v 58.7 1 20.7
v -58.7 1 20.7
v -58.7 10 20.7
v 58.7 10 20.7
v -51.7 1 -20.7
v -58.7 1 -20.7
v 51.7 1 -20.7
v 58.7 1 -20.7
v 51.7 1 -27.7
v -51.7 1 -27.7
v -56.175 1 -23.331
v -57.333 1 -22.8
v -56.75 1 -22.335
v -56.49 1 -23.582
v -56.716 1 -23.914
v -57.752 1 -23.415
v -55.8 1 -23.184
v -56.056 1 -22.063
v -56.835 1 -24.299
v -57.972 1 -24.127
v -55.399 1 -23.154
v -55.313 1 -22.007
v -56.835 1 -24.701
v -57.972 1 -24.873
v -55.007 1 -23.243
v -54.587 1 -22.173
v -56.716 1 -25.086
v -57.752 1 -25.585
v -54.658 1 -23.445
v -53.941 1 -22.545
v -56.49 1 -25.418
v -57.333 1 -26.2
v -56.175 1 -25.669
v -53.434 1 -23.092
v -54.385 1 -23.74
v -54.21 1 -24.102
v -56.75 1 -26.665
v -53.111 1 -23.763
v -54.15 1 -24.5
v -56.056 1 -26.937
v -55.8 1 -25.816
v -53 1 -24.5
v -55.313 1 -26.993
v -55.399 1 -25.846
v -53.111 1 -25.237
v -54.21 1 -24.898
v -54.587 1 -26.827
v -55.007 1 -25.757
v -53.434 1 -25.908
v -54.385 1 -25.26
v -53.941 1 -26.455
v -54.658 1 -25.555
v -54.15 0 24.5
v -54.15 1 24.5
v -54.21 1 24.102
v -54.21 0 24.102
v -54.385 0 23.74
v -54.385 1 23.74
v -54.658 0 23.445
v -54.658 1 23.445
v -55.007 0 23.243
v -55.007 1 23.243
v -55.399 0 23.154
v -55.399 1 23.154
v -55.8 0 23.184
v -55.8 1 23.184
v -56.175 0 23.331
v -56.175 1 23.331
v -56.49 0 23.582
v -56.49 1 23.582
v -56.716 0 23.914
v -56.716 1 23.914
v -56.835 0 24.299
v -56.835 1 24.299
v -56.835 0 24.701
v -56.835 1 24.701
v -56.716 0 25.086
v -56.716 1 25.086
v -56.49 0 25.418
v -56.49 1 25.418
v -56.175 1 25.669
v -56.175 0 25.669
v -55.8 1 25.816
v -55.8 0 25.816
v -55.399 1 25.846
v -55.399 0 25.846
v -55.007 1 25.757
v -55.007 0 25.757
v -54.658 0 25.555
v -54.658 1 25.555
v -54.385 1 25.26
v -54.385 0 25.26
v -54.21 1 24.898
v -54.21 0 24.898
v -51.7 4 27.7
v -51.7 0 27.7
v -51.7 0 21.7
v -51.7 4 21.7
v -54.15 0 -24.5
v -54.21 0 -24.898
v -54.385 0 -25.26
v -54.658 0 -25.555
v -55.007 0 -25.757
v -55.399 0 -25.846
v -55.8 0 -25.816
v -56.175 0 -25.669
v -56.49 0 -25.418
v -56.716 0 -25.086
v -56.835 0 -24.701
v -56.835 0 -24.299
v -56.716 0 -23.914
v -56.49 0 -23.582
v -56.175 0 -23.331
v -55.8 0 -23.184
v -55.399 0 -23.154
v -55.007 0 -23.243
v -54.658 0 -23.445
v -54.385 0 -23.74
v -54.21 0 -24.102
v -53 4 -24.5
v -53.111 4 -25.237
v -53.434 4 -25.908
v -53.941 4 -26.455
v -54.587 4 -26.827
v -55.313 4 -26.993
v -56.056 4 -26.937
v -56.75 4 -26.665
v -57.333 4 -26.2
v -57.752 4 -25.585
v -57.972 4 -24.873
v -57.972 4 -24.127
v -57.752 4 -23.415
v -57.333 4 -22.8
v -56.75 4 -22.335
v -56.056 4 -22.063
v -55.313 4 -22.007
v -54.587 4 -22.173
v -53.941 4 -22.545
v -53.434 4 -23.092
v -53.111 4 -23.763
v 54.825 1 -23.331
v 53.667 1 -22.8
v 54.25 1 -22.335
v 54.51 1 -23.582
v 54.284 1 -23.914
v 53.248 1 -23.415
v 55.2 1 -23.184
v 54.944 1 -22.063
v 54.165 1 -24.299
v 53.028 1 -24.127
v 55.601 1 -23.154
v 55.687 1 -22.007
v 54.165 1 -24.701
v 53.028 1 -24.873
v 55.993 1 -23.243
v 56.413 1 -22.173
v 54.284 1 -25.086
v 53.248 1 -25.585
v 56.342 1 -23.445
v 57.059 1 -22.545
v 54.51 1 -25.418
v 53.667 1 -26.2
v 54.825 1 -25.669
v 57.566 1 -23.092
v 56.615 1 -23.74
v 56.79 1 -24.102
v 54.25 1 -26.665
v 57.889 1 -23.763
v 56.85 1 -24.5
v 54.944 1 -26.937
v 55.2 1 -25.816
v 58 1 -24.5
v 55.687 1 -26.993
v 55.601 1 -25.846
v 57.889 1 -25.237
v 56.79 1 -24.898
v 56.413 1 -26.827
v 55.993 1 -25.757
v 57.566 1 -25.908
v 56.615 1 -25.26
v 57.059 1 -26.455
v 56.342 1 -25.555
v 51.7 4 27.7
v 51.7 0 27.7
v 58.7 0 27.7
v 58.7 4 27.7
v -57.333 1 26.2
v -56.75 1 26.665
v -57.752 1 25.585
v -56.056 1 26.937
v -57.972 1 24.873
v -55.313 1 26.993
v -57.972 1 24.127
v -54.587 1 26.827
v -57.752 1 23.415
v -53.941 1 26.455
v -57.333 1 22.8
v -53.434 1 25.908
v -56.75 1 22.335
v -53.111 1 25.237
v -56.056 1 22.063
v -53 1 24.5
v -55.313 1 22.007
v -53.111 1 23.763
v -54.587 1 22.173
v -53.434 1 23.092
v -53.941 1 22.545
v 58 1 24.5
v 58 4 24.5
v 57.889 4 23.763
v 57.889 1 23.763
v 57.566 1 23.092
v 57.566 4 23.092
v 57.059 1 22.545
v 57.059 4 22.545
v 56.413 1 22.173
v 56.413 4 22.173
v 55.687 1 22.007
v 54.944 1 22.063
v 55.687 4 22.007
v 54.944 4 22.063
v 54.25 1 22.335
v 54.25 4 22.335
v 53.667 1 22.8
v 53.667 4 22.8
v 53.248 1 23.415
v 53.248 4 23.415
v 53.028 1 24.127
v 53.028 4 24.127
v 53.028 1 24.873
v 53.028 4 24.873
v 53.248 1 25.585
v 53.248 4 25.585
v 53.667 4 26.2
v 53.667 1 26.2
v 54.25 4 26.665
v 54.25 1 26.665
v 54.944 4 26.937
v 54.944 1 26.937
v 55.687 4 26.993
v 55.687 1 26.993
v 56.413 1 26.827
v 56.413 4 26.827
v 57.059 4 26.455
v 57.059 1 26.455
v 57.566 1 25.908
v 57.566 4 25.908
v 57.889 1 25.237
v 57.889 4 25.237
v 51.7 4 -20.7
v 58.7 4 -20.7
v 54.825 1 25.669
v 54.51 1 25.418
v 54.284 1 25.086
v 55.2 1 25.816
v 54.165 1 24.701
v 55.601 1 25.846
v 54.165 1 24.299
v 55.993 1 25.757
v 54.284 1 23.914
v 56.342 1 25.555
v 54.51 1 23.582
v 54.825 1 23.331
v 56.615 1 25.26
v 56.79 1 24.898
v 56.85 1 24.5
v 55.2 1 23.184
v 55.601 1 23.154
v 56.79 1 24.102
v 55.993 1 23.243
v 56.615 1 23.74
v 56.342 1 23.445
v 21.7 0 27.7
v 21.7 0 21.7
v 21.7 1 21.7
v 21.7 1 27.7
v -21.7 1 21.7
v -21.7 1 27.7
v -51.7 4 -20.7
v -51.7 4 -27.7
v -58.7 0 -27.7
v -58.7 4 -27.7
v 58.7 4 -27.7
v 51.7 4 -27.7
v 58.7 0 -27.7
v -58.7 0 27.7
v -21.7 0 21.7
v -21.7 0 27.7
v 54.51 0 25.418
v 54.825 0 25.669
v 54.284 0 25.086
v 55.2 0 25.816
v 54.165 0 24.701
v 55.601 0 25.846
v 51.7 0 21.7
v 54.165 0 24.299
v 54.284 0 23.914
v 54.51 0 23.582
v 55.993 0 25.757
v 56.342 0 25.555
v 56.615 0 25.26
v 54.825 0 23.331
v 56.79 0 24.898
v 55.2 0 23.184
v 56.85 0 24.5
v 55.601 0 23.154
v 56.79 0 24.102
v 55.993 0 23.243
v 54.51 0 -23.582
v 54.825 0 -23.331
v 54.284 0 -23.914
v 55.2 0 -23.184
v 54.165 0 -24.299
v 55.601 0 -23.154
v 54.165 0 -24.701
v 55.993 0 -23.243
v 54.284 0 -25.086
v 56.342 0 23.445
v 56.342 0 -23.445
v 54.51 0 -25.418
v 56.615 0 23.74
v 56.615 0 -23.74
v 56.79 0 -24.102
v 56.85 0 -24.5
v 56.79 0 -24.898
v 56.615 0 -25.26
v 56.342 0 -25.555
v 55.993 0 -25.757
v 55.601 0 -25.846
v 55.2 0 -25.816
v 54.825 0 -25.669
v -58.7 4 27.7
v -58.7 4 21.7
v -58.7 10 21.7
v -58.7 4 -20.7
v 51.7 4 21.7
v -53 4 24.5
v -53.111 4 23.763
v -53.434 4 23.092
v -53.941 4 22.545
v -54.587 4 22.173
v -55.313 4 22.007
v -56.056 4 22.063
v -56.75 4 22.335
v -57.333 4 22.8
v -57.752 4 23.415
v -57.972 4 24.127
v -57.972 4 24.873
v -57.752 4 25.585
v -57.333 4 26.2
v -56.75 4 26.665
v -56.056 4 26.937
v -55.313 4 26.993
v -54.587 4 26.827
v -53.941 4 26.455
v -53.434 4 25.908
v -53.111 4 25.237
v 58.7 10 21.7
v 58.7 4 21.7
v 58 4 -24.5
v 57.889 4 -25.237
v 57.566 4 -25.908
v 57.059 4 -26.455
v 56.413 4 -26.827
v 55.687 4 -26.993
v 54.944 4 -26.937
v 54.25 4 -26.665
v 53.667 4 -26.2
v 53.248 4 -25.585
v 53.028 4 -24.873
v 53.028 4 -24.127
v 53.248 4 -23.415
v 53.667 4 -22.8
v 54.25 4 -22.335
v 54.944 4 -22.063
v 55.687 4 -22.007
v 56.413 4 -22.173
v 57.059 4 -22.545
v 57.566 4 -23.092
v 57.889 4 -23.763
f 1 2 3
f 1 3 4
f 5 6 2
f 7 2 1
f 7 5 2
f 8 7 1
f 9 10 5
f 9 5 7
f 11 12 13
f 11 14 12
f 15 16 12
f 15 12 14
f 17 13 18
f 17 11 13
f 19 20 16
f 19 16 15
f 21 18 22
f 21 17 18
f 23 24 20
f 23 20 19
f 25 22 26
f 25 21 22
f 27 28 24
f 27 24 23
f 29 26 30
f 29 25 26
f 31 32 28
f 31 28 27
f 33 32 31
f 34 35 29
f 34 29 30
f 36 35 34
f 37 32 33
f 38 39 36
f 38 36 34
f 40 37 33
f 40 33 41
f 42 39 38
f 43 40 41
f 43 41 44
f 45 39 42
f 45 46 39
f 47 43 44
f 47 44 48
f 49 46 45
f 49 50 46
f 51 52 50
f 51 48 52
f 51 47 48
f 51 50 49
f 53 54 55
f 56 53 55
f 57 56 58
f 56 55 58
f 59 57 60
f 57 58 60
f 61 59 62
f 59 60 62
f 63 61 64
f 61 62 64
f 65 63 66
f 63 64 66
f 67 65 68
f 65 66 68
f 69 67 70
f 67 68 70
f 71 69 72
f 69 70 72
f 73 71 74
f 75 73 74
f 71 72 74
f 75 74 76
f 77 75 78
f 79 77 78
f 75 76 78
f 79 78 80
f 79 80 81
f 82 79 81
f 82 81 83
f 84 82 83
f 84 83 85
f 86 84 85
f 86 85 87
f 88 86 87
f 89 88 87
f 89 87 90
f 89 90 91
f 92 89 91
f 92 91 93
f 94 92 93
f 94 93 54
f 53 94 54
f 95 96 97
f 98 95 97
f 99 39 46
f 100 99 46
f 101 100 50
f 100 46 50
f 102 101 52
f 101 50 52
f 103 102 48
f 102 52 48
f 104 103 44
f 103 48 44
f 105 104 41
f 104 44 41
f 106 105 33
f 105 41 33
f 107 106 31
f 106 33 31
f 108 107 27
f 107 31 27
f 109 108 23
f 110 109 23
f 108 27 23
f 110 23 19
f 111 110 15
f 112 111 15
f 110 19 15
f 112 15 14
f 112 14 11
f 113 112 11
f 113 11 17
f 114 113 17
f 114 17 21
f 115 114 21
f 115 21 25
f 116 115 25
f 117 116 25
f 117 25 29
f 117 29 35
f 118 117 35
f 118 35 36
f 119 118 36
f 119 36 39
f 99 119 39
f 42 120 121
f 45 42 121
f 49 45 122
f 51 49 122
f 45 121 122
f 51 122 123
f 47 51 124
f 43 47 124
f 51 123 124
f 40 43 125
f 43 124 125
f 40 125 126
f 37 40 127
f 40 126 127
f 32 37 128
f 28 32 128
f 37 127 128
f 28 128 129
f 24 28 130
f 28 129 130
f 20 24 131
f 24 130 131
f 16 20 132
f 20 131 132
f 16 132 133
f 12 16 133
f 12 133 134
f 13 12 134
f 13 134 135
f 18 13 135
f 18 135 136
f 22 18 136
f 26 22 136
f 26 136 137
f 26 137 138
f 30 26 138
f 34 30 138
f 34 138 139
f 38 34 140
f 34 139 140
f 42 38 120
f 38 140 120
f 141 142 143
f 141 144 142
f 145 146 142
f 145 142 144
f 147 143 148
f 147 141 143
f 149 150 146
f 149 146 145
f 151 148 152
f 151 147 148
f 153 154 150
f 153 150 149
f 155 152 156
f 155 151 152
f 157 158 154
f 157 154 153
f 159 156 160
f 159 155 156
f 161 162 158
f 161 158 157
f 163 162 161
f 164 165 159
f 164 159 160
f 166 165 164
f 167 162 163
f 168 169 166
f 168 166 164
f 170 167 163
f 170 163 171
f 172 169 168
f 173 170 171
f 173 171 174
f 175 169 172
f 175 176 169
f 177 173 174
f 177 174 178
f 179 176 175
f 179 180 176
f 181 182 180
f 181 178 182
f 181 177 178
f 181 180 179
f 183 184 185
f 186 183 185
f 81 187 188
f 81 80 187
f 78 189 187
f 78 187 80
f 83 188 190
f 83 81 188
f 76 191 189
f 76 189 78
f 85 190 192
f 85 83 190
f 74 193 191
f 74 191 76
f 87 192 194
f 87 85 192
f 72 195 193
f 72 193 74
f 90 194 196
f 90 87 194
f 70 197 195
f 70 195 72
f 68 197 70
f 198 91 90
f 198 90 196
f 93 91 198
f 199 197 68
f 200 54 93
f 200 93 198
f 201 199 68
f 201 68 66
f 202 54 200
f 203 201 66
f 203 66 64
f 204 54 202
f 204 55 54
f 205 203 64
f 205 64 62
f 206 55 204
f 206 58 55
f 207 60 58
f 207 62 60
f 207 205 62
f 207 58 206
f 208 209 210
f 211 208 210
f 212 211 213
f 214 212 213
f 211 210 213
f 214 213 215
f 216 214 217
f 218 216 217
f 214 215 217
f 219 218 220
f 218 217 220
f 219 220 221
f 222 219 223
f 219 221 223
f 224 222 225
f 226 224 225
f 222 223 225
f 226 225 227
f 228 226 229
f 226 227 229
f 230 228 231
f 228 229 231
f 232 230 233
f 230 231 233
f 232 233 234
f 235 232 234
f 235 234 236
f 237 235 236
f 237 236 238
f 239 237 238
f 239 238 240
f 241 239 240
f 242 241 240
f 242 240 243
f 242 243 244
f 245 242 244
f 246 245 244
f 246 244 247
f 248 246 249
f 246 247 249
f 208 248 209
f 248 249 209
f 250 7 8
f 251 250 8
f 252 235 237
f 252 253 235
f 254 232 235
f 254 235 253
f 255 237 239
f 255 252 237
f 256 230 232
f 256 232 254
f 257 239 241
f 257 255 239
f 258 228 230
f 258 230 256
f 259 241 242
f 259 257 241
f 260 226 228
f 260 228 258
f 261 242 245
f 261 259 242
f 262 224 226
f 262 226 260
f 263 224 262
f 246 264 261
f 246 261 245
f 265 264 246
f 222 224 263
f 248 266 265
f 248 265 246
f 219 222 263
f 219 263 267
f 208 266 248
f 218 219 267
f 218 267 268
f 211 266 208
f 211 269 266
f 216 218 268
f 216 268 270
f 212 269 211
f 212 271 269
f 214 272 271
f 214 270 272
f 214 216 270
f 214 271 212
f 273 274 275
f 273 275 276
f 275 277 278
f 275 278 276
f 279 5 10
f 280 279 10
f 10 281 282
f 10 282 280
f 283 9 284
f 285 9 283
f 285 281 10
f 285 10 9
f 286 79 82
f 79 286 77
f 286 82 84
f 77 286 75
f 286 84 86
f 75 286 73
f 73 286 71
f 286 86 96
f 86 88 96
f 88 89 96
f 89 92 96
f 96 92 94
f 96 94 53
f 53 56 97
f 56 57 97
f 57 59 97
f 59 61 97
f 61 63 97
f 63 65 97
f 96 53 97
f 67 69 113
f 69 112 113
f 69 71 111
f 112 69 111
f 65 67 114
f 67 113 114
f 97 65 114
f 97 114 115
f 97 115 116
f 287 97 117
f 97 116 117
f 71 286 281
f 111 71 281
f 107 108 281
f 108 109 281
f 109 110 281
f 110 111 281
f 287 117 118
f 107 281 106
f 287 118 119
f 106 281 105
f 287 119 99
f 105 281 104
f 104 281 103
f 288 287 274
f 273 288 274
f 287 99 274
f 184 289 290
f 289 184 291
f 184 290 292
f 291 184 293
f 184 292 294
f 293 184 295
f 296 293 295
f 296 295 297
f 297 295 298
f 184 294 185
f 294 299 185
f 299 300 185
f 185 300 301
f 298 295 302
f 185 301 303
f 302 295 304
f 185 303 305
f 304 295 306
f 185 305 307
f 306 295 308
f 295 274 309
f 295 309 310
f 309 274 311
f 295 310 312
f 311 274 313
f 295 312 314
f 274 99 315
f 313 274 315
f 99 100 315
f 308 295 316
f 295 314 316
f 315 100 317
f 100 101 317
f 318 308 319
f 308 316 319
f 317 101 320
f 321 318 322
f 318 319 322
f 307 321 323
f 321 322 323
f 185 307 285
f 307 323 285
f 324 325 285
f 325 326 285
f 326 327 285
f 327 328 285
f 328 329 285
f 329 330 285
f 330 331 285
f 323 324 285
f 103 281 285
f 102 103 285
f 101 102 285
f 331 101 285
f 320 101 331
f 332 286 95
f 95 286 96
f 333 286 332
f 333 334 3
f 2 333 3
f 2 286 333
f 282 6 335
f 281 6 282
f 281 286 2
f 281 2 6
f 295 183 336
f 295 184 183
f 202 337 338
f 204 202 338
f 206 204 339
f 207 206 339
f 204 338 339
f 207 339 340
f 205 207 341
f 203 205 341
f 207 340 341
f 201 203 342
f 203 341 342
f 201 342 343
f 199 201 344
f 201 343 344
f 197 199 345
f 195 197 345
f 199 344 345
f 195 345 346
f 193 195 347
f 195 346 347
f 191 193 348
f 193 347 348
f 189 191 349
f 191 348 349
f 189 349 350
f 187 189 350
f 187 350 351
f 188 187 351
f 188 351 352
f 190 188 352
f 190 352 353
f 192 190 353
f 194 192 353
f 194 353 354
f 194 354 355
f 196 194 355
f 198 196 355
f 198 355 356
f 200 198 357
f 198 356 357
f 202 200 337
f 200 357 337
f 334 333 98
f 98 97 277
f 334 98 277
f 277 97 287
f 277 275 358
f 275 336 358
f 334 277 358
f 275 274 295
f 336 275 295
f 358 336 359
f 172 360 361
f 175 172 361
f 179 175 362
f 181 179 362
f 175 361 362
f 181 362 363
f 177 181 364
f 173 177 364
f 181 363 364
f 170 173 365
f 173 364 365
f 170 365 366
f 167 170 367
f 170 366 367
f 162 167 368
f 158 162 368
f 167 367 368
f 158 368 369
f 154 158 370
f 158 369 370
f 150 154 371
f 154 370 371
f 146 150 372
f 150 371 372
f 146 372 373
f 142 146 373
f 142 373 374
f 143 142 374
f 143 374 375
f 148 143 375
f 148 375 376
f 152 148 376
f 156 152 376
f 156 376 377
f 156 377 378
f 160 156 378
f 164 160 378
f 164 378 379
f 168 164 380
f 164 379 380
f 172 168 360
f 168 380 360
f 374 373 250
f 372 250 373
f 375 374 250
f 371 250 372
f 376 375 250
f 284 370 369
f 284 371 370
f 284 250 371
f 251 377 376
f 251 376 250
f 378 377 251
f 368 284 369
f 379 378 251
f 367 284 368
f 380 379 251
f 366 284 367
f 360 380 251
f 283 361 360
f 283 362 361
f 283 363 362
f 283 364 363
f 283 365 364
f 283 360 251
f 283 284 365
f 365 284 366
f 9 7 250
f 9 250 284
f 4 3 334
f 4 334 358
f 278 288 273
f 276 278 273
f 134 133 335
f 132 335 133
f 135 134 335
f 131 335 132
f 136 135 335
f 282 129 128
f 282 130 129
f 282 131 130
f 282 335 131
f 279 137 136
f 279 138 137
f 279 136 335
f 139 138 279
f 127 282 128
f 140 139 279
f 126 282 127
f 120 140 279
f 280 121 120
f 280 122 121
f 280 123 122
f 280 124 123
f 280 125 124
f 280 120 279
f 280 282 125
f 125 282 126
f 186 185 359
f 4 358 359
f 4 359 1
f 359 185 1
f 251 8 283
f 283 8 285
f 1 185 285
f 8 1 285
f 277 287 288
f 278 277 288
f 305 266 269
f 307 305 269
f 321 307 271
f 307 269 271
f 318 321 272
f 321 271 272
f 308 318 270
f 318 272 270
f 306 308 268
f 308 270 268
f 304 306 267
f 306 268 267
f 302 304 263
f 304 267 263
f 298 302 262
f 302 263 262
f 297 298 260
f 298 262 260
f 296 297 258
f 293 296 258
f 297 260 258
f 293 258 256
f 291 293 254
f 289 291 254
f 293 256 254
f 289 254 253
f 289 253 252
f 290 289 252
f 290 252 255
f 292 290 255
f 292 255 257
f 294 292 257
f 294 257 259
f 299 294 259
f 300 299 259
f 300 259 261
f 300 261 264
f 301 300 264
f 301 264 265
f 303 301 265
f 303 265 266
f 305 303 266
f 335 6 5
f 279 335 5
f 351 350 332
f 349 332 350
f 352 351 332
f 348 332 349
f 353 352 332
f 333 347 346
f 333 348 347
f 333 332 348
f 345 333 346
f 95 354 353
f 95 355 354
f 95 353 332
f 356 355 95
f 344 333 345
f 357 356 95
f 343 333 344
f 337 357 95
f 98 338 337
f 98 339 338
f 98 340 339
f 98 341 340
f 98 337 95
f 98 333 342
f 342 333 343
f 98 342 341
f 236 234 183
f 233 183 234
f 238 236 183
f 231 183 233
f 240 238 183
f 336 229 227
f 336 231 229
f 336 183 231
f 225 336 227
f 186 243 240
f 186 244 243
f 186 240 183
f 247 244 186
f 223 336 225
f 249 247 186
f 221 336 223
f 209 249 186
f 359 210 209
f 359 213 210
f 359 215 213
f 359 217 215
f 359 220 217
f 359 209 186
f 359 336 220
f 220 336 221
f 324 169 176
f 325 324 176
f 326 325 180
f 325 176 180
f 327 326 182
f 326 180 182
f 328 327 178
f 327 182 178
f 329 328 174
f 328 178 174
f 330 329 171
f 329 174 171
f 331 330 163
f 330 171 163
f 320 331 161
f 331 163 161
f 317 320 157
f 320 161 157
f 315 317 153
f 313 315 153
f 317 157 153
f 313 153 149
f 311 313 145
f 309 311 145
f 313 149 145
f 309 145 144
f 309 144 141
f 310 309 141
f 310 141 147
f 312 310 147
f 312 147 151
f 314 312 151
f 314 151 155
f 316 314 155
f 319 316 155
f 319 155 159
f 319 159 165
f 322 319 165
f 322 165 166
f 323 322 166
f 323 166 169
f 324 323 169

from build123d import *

# Parameters (mm, degrees)
SKETCH1_W           = 117.4
SKETCH1_H           = 55.4
BOSS_EXTRUDE1_DEPTH = 1
SKETCH2_W           = 7
SKETCH2_H           = 7
BOSS_EXTRUDE2_DEPTH = 3
SKETCH3_R           = 1.35
CUT_EXTRUDE1_DEPTH  = 5
SKETCH7_W           = 30
SKETCH7_H           = 6
CUT_EXTRUDE5_DEPTH  = 5
SKETCH9_R           = 2.5
CUT_EXTRUDE6_DEPTH  = 3
SKETCH10_W          = 117.4
SKETCH10_H          = 1
BOSS_EXTRUDE3_DEPTH = 9


with BuildPart() as part:
    # Sketch1 → Boss-Extrude1 (new body)
    with BuildSketch(Plane(origin=(0, 0, 0), x_dir=(1, 0, 0), z_dir=(0, 1, 0))):
        Rectangle(SKETCH1_W, SKETCH1_H)
    extrude(amount=BOSS_EXTRUDE1_DEPTH)

    # Sketch2 → Boss-Extrude2 (add)
    with BuildSketch(Plane(origin=(0, 1, 0), x_dir=(1, 0, 0), z_dir=(0, 1, 0))):
        with Locations((55.2, 24.2)):
            Rectangle(SKETCH2_W, SKETCH2_H)
        with Locations((-55.2, 24.2)):
            Rectangle(SKETCH2_W, SKETCH2_H)
        with Locations((55.2, -24.2)):
            Rectangle(SKETCH2_W, SKETCH2_H)
        with Locations((-55.2, -24.2)):
            Rectangle(SKETCH2_W, SKETCH2_H)
    extrude(amount=BOSS_EXTRUDE2_DEPTH)

    # Sketch3 → Cut-Extrude1 (cut, through all)
    with BuildSketch(Plane(origin=(0, 4, 0), x_dir=(1, 0, 0), z_dir=(0, 1, 0))):
        with Locations((-55.5, 24.5)):
            Circle(SKETCH3_R)
        with Locations((55.5, 24.5)):
            Circle(SKETCH3_R)
        with Locations((55.5, -24.5)):
            Circle(SKETCH3_R)
        with Locations((-55.5, -24.5)):
            Circle(SKETCH3_R)
    extrude(amount=-CUT_EXTRUDE1_DEPTH, mode=Mode.SUBTRACT)

    # Sketch7 → Cut-Extrude5 (cut, through all)
    with BuildSketch(Plane.XZ):
        with Locations((36.7, 24.7)):
            Rectangle(SKETCH7_W, SKETCH7_H)
        with Locations((-36.7, 24.7)):
            Rectangle(SKETCH7_W, SKETCH7_H)
    extrude(amount=-CUT_EXTRUDE5_DEPTH, mode=Mode.SUBTRACT)

    # Sketch9 → Cut-Extrude6 (cut)
    with BuildSketch(Plane(origin=(0, 4, 0), x_dir=(1, 0, 0), z_dir=(0, 1, 0))):
        with Locations((-55.5, 24.5)):
            Circle(SKETCH9_R)
        with Locations((55.5, 24.5)):
            Circle(SKETCH9_R)
        with Locations((55.5, -24.5)):
            Circle(SKETCH9_R)
        with Locations((-55.5, -24.5)):
            Circle(SKETCH9_R)
    extrude(amount=-CUT_EXTRUDE6_DEPTH, mode=Mode.SUBTRACT)

    # Sketch10 → Boss-Extrude3 (add)
    with BuildSketch(Plane(origin=(0, 1, 0), x_dir=(1, 0, 0), z_dir=(0, 1, 0))):
        with Locations((0, -21.2)):
            Rectangle(SKETCH10_W, SKETCH10_H)
    extrude(amount=BOSS_EXTRUDE3_DEPTH)


solid = part.part
